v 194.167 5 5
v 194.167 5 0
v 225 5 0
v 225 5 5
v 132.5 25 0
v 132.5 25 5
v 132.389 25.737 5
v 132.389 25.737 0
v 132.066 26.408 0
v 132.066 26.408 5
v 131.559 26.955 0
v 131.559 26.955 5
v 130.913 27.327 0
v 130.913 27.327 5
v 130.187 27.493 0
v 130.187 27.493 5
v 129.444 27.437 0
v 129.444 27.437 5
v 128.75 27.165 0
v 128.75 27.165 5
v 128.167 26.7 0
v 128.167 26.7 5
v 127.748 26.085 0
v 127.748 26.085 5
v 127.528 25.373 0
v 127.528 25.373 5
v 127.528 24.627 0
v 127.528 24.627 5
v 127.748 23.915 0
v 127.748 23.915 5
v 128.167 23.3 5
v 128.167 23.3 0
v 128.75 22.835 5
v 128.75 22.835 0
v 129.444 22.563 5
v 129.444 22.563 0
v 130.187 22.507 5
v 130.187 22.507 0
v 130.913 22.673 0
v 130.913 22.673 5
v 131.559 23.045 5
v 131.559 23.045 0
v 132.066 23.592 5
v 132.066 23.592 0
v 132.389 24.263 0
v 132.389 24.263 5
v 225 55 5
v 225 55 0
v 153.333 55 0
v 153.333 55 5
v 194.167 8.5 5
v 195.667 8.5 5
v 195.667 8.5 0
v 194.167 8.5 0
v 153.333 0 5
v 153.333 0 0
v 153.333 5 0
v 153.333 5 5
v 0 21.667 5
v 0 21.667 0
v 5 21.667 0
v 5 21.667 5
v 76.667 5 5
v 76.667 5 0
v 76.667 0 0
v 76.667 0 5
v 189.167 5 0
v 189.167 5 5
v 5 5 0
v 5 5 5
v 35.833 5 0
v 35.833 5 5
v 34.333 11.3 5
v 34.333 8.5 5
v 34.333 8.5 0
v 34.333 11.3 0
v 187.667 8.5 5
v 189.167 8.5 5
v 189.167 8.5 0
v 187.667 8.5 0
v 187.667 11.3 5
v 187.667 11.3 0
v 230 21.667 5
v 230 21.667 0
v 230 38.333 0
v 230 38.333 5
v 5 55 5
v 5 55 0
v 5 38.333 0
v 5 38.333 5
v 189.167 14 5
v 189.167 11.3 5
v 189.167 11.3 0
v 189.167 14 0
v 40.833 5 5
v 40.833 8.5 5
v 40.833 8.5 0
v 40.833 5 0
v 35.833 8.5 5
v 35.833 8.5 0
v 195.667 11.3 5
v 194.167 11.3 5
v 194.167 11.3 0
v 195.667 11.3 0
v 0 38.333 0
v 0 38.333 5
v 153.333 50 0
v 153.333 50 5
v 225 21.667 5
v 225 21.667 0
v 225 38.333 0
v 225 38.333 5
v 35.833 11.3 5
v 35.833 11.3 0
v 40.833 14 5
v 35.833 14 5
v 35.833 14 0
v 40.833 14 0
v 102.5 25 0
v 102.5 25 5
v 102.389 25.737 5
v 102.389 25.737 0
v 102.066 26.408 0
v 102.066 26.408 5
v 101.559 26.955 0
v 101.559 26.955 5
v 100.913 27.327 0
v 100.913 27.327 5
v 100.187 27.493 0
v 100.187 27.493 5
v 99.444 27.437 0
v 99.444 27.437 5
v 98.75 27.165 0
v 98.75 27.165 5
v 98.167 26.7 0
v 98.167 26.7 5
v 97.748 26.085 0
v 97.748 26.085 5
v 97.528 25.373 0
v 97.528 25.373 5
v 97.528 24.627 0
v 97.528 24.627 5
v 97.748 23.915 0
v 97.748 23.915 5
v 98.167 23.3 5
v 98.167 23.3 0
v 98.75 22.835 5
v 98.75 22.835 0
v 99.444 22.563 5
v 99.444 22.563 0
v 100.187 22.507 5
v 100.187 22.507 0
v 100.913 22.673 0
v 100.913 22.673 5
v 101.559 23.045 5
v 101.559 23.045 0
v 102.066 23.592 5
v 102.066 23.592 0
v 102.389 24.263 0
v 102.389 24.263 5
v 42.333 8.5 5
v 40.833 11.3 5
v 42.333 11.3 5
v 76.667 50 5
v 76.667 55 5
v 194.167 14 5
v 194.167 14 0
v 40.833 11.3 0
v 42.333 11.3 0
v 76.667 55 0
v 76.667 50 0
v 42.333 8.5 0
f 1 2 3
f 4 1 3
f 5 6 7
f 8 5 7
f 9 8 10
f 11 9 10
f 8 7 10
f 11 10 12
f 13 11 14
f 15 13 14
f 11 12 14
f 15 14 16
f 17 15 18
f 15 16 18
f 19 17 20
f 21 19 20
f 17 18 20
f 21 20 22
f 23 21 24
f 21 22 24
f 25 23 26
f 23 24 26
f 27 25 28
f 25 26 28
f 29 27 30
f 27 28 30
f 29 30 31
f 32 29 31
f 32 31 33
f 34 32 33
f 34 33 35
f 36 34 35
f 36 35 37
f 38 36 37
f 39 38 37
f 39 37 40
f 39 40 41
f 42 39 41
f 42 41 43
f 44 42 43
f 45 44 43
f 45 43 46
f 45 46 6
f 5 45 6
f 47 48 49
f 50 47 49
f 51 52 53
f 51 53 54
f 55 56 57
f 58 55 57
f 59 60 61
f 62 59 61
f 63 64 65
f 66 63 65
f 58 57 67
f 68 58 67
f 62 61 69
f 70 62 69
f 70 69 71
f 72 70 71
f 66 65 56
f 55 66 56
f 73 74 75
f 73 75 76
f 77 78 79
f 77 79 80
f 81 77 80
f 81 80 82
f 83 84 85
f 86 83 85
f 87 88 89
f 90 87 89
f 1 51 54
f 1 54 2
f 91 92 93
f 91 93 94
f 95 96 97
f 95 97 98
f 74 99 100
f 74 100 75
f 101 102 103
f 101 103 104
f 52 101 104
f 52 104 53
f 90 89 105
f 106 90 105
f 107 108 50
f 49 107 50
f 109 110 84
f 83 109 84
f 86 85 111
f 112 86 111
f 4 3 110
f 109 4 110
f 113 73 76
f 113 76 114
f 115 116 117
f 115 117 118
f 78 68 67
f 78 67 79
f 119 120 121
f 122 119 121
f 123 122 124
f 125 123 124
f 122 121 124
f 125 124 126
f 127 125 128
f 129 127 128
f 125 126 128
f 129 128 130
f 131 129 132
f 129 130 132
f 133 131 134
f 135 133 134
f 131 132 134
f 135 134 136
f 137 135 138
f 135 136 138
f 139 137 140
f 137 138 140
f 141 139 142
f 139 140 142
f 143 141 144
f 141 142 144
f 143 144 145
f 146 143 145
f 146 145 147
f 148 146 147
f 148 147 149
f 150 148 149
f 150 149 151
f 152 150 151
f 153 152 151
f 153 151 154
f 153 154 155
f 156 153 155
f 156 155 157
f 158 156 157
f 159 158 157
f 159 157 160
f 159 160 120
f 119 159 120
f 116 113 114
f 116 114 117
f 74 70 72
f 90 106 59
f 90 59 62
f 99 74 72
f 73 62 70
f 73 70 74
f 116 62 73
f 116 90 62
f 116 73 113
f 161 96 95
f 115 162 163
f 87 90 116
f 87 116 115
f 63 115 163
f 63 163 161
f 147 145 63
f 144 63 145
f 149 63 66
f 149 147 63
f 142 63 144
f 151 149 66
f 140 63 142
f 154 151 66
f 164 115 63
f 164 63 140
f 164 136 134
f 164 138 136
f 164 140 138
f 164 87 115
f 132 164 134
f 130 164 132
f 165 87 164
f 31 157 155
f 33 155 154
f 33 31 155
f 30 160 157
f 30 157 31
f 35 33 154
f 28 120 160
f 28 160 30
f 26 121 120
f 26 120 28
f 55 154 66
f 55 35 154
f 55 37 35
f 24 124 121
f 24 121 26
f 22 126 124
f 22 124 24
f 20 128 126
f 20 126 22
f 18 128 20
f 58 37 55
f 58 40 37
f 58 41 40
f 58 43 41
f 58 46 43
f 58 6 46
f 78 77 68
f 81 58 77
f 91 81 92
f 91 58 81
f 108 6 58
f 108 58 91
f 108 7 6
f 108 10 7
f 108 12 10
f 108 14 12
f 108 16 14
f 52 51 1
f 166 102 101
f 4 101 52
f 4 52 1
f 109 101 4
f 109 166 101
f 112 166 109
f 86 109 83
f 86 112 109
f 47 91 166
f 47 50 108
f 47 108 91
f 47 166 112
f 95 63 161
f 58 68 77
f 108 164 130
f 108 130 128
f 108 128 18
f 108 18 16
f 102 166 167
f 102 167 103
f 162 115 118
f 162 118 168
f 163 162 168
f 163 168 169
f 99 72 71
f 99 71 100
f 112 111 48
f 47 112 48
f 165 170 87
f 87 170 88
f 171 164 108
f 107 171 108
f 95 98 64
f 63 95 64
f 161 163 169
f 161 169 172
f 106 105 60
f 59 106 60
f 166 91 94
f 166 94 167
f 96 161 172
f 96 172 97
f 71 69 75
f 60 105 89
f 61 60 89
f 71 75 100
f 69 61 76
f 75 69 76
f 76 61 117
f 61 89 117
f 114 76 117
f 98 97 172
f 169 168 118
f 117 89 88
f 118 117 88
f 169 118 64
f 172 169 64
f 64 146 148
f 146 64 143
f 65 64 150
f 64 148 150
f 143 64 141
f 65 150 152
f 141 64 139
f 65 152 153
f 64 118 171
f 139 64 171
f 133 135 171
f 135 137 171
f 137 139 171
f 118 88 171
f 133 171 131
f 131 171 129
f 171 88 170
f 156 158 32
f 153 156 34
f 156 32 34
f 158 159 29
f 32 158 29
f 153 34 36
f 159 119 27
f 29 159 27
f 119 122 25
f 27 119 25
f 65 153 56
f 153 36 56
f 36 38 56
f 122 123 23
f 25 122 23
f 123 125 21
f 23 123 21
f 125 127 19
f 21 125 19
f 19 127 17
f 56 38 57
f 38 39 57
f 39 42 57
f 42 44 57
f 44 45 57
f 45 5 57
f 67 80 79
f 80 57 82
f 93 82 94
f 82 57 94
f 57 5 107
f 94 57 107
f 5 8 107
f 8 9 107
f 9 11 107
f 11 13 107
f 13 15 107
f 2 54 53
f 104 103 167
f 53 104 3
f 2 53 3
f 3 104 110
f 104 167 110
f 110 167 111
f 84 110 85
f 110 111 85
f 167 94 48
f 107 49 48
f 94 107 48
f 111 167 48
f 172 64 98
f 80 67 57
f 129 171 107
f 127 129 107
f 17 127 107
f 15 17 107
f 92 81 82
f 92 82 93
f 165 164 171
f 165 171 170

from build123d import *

# Parameters (mm, degrees)
SALIENTE_EXTRUIR1_DEPTH = 5
CORTAR_EXTRUIR1_DEPTH   = 5
CROQUIS3_W              = 76.666666666
CROQUIS3_H              = 5
CORTAR_EXTRUIR2_DEPTH   = 10
CROQUIS4_R              = 2.5
CORTAR_EXTRUIR3_DEPTH   = 10


with BuildPart() as part:
    # Croquis1 → Saliente-Extruir1 (new body)
    with BuildSketch(Plane.XY):
        Polygon((76.666666667, 5), (76.666666667, 0), (153.333333333, 0), (153.333333333, 5), (225, 5), (225, 21.666666667), (230, 21.666666667), (230, 38.333333333), (225, 38.333333333), (225, 55), (5, 55), (5, 38.333333333), (0, 38.333333333), (0, 21.666666667), (5, 21.666666667), (5, 5), align=None)
    extrude(amount=SALIENTE_EXTRUIR1_DEPTH)

    # Croquis2 → Cortar-Extruir1 (cut)
    with BuildSketch(Plane.XY.offset(5)):
        Polygon((35.833333333, 5), (35.833333333, 8.5), (34.333333333, 8.5), (34.333333333, 11.3), (35.833333333, 11.3), (35.833333333, 14), (40.833333333, 14), (40.833333333, 11.3), (42.333333333, 11.3), (42.333333333, 8.5), (40.833333333, 8.5), (40.833333333, 5), align=None)
        Polygon((189.166666667, 5), (189.166666667, 8.5), (187.666666667, 8.5), (187.666666667, 11.3), (189.166666667, 11.3), (189.166666667, 14), (194.166666667, 14), (194.166666667, 11.3), (195.666666667, 11.3), (195.666666667, 8.5), (194.166666667, 8.5), (194.166666667, 5), align=None)
    extrude(amount=-CORTAR_EXTRUIR1_DEPTH, mode=Mode.SUBTRACT)

    # Croquis3 → Cortar-Extruir2 (cut)
    with BuildSketch(Plane.XY.offset(5)):
        with Locations((115, 52.5)):
            Rectangle(CROQUIS3_W, CROQUIS3_H)
    extrude(amount=-CORTAR_EXTRUIR2_DEPTH, mode=Mode.SUBTRACT)

    # Croquis4 → Cortar-Extruir3 (cut)
    with BuildSketch(Plane.XY.offset(5)):
        with Locations((100, 25)):
            Circle(CROQUIS4_R)
        with Locations((130, 25)):
            Circle(CROQUIS4_R)
    extrude(amount=-CORTAR_EXTRUIR3_DEPTH, mode=Mode.SUBTRACT)


solid = part.part
